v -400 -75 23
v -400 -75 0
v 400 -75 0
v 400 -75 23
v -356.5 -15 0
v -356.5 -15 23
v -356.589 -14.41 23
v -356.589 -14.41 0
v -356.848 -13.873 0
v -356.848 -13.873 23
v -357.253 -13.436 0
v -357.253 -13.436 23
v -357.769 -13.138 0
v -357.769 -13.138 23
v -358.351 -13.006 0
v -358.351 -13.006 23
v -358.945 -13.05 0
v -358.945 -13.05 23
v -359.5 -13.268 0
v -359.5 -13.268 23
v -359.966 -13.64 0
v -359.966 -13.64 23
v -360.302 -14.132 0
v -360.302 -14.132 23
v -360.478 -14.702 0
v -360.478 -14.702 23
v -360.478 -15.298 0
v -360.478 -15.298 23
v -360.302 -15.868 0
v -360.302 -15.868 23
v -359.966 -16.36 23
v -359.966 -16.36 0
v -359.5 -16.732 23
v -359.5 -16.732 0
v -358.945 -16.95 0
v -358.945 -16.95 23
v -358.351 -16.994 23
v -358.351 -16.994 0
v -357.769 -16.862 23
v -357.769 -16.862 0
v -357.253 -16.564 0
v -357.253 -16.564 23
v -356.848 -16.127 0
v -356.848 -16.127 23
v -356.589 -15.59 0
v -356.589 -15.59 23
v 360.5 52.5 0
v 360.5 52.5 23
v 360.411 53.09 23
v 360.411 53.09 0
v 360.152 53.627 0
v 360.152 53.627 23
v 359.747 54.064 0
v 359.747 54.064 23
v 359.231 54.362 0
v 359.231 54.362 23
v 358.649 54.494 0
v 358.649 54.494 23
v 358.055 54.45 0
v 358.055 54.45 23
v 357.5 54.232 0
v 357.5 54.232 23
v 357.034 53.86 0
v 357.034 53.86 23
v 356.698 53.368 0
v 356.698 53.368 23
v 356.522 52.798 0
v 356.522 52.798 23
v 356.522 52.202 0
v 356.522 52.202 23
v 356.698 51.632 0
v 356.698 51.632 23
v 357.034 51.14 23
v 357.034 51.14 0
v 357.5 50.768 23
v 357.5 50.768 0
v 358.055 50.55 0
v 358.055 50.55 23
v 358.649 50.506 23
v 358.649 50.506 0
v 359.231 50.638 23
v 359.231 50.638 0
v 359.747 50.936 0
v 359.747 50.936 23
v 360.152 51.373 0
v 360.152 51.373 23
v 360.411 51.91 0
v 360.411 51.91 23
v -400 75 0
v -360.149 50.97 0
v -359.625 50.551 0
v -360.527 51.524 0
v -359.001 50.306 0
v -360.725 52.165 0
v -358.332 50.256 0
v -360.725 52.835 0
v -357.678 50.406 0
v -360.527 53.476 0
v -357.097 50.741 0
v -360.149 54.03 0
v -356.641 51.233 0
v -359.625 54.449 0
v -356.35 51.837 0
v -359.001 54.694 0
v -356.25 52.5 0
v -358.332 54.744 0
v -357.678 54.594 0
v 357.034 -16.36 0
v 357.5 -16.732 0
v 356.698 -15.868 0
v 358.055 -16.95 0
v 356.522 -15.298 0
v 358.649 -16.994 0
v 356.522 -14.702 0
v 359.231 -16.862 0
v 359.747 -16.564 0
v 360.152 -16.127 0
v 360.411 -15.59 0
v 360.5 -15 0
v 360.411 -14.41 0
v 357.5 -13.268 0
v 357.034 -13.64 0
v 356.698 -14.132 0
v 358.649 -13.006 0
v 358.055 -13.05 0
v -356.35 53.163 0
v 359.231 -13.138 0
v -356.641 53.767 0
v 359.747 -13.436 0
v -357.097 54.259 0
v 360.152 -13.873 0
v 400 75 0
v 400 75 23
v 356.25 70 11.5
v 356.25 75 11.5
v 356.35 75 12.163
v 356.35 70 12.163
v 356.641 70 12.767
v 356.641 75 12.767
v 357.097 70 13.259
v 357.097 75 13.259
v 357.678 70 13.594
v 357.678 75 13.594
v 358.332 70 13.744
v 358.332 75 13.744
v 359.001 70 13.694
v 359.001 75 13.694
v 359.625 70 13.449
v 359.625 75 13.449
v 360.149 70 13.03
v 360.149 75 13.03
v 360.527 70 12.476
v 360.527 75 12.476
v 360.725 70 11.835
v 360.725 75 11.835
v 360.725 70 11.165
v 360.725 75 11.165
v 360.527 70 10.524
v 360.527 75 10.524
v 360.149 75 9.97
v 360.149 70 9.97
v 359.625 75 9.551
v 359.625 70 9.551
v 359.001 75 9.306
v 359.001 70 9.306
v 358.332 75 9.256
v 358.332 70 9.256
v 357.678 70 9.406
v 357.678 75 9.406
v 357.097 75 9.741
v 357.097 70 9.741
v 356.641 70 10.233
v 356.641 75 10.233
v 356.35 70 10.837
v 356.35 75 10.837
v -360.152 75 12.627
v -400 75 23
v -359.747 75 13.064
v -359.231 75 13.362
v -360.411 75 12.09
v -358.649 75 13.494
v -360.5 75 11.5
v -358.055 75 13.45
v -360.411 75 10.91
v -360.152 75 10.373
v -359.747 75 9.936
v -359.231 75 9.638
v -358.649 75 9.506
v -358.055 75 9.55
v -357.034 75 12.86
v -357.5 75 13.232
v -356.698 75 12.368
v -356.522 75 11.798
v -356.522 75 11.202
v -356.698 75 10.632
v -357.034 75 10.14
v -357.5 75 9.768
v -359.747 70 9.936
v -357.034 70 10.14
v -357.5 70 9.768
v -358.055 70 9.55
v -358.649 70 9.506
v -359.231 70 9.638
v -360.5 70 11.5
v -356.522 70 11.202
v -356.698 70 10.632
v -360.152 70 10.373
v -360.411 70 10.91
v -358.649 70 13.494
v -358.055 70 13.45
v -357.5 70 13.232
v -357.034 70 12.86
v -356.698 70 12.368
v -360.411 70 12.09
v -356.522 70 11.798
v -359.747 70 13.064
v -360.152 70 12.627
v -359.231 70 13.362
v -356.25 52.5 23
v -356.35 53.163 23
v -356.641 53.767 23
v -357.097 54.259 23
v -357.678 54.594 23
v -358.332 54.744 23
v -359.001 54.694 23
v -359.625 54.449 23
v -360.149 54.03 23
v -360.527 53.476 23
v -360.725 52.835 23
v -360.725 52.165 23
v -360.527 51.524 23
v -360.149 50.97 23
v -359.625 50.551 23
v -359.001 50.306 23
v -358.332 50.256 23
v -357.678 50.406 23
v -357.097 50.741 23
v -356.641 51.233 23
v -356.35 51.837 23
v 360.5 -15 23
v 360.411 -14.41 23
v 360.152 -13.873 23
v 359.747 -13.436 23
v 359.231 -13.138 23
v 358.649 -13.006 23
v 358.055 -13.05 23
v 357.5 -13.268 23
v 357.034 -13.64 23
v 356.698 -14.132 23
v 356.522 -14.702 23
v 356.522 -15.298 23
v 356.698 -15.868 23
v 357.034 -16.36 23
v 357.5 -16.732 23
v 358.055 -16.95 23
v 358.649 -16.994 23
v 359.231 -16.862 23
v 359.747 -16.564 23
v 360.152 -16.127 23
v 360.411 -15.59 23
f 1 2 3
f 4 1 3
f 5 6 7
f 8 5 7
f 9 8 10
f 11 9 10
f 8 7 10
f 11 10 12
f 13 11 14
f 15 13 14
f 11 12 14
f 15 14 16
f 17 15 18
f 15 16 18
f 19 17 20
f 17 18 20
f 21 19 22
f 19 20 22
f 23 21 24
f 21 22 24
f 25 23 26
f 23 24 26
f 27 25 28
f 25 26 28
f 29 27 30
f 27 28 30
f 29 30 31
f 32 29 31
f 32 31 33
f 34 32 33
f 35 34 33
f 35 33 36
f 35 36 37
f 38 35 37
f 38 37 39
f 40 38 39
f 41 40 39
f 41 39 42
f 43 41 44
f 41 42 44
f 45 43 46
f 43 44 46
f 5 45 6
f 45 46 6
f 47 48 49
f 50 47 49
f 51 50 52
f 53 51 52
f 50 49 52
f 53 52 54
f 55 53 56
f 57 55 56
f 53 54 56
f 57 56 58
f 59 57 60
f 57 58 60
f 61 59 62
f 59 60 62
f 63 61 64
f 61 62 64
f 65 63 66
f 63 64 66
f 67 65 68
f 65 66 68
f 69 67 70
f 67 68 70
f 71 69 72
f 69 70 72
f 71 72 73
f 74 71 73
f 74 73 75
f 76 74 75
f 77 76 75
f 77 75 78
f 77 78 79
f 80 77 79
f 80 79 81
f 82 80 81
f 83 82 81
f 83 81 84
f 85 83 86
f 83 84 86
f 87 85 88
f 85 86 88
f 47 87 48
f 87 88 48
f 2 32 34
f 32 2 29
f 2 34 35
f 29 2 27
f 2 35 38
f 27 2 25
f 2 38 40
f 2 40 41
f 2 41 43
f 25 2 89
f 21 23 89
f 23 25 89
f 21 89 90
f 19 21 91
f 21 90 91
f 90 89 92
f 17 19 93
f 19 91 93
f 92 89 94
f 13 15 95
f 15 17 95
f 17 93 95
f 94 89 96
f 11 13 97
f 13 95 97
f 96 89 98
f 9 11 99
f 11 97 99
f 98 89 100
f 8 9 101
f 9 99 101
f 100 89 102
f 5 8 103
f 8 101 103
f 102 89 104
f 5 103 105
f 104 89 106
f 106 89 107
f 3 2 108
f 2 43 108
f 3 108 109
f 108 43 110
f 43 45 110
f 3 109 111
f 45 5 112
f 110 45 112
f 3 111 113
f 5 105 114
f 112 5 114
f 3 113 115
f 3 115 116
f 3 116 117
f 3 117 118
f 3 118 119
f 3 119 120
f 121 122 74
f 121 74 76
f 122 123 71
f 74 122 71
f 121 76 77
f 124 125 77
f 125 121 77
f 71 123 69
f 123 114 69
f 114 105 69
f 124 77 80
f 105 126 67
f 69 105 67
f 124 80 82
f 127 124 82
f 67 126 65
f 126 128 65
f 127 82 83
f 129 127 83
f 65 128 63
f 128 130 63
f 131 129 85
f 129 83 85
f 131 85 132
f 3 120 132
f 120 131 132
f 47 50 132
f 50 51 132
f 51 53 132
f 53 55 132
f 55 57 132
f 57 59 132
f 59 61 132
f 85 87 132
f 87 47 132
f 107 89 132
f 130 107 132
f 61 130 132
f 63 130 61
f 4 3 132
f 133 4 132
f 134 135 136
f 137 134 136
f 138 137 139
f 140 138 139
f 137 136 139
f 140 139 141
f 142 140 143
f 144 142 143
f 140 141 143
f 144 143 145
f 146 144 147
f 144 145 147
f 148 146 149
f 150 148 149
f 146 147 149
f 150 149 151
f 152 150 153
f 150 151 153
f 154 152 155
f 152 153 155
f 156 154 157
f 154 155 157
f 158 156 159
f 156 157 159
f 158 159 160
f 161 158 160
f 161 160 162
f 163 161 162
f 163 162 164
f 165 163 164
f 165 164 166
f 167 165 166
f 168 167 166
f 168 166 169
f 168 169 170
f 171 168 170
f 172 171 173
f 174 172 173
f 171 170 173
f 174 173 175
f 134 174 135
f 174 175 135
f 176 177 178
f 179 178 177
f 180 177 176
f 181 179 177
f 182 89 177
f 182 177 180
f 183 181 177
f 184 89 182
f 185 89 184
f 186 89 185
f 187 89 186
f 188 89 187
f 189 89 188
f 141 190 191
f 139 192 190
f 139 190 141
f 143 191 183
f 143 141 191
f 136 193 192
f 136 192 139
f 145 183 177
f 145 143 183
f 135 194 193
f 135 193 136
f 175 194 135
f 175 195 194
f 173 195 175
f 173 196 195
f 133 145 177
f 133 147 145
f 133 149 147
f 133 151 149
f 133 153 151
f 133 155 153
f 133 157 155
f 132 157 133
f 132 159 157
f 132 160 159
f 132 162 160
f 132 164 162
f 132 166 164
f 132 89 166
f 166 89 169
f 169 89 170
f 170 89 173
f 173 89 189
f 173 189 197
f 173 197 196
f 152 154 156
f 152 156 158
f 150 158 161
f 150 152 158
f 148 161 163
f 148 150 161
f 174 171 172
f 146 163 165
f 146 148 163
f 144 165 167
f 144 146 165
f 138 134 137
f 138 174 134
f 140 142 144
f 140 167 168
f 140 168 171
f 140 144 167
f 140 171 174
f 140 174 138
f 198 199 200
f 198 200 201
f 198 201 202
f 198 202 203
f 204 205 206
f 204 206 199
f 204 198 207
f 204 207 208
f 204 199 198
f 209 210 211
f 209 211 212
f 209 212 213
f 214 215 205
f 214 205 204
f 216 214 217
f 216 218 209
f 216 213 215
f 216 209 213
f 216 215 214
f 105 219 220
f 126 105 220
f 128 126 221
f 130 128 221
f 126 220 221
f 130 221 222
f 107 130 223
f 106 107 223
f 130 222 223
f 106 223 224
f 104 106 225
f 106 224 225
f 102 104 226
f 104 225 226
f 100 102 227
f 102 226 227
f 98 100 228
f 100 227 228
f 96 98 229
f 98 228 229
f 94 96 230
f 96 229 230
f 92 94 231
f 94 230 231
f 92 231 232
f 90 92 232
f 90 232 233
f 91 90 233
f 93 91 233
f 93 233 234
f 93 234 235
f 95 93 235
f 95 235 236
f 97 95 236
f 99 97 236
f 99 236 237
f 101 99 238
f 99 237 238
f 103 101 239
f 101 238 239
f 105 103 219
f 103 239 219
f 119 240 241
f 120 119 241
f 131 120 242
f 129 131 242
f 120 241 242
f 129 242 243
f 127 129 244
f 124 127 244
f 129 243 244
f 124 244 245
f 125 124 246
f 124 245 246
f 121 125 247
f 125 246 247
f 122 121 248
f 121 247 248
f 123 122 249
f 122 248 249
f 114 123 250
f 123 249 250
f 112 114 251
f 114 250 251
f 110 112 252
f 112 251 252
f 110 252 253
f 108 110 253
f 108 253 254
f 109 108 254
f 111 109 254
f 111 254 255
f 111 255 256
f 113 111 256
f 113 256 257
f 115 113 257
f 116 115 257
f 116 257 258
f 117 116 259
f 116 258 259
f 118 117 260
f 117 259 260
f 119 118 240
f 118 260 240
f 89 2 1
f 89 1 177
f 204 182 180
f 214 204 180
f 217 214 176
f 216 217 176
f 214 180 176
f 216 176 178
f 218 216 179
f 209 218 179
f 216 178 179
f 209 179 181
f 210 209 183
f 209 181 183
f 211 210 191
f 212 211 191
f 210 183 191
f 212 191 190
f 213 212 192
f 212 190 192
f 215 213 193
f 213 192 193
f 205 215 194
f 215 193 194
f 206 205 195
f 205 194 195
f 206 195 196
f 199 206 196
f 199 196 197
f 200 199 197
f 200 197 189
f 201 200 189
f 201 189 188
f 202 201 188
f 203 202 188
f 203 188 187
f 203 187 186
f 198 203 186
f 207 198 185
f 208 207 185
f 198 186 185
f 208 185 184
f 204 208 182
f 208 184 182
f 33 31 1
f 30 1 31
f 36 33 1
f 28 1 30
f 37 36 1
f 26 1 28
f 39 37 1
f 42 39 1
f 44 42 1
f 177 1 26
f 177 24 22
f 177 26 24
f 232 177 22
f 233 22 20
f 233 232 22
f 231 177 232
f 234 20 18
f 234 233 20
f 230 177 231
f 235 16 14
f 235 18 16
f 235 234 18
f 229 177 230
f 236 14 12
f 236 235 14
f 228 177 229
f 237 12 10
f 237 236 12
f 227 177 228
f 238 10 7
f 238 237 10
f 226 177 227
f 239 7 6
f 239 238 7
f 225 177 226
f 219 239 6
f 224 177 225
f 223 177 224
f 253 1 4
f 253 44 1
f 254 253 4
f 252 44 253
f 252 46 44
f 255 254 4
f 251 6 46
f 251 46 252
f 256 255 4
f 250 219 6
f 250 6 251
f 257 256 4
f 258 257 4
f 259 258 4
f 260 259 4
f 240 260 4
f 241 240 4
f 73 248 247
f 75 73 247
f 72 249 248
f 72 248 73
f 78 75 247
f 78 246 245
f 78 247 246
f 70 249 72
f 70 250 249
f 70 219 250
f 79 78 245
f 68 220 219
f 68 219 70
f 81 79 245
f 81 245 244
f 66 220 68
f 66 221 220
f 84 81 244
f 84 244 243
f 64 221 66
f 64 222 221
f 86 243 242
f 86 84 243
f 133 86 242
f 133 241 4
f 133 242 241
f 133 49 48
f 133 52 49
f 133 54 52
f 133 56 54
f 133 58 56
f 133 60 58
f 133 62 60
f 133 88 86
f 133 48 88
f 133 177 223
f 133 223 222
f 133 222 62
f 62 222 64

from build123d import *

# Parameters (mm, degrees)
SKETCH_W        = 800
SKETCH_H        = 150
PAD_DEPTH       = 23
SKETCH005_R     = 2.25
SKETCH005_R_2   = 2
POCKET002_DEPTH = 23
SKETCH006_R     = 2.25
SKETCH006_R_2   = 2
POCKET003_DEPTH = 5


with BuildPart() as part:
    # Sketch → Pad (new body)
    with BuildSketch(Plane.XY):
        Rectangle(SKETCH_W, SKETCH_H)
    extrude(amount=PAD_DEPTH)

    # Sketch005 (on Face6 of Pad) → Pocket002 (cut)
    with BuildSketch(Plane.XY.offset(23)):
        with Locations((-358.5, 52.5)):
            Circle(SKETCH005_R)
        with Locations((-358.5, -15)):
            Circle(SKETCH005_R_2)
        with Locations((358.5, -15)):
            Circle(SKETCH005_R_2)
        with Locations((358.5, 52.5)):
            Circle(SKETCH005_R_2)
    extrude(amount=-POCKET002_DEPTH, mode=Mode.SUBTRACT)

    # Sketch006 (on Face3 of Pocket002) → Pocket003 (cut)
    with BuildSketch(Plane(origin=(0, 75, 0), x_dir=(-1, 0, 0), z_dir=(0, 1, 0))):
        with Locations((-358.5, 11.5)):
            Circle(SKETCH006_R)
        with Locations((358.5, 11.5)):
            Circle(SKETCH006_R_2)
    extrude(amount=-POCKET003_DEPTH, mode=Mode.SUBTRACT)


solid = part.part
